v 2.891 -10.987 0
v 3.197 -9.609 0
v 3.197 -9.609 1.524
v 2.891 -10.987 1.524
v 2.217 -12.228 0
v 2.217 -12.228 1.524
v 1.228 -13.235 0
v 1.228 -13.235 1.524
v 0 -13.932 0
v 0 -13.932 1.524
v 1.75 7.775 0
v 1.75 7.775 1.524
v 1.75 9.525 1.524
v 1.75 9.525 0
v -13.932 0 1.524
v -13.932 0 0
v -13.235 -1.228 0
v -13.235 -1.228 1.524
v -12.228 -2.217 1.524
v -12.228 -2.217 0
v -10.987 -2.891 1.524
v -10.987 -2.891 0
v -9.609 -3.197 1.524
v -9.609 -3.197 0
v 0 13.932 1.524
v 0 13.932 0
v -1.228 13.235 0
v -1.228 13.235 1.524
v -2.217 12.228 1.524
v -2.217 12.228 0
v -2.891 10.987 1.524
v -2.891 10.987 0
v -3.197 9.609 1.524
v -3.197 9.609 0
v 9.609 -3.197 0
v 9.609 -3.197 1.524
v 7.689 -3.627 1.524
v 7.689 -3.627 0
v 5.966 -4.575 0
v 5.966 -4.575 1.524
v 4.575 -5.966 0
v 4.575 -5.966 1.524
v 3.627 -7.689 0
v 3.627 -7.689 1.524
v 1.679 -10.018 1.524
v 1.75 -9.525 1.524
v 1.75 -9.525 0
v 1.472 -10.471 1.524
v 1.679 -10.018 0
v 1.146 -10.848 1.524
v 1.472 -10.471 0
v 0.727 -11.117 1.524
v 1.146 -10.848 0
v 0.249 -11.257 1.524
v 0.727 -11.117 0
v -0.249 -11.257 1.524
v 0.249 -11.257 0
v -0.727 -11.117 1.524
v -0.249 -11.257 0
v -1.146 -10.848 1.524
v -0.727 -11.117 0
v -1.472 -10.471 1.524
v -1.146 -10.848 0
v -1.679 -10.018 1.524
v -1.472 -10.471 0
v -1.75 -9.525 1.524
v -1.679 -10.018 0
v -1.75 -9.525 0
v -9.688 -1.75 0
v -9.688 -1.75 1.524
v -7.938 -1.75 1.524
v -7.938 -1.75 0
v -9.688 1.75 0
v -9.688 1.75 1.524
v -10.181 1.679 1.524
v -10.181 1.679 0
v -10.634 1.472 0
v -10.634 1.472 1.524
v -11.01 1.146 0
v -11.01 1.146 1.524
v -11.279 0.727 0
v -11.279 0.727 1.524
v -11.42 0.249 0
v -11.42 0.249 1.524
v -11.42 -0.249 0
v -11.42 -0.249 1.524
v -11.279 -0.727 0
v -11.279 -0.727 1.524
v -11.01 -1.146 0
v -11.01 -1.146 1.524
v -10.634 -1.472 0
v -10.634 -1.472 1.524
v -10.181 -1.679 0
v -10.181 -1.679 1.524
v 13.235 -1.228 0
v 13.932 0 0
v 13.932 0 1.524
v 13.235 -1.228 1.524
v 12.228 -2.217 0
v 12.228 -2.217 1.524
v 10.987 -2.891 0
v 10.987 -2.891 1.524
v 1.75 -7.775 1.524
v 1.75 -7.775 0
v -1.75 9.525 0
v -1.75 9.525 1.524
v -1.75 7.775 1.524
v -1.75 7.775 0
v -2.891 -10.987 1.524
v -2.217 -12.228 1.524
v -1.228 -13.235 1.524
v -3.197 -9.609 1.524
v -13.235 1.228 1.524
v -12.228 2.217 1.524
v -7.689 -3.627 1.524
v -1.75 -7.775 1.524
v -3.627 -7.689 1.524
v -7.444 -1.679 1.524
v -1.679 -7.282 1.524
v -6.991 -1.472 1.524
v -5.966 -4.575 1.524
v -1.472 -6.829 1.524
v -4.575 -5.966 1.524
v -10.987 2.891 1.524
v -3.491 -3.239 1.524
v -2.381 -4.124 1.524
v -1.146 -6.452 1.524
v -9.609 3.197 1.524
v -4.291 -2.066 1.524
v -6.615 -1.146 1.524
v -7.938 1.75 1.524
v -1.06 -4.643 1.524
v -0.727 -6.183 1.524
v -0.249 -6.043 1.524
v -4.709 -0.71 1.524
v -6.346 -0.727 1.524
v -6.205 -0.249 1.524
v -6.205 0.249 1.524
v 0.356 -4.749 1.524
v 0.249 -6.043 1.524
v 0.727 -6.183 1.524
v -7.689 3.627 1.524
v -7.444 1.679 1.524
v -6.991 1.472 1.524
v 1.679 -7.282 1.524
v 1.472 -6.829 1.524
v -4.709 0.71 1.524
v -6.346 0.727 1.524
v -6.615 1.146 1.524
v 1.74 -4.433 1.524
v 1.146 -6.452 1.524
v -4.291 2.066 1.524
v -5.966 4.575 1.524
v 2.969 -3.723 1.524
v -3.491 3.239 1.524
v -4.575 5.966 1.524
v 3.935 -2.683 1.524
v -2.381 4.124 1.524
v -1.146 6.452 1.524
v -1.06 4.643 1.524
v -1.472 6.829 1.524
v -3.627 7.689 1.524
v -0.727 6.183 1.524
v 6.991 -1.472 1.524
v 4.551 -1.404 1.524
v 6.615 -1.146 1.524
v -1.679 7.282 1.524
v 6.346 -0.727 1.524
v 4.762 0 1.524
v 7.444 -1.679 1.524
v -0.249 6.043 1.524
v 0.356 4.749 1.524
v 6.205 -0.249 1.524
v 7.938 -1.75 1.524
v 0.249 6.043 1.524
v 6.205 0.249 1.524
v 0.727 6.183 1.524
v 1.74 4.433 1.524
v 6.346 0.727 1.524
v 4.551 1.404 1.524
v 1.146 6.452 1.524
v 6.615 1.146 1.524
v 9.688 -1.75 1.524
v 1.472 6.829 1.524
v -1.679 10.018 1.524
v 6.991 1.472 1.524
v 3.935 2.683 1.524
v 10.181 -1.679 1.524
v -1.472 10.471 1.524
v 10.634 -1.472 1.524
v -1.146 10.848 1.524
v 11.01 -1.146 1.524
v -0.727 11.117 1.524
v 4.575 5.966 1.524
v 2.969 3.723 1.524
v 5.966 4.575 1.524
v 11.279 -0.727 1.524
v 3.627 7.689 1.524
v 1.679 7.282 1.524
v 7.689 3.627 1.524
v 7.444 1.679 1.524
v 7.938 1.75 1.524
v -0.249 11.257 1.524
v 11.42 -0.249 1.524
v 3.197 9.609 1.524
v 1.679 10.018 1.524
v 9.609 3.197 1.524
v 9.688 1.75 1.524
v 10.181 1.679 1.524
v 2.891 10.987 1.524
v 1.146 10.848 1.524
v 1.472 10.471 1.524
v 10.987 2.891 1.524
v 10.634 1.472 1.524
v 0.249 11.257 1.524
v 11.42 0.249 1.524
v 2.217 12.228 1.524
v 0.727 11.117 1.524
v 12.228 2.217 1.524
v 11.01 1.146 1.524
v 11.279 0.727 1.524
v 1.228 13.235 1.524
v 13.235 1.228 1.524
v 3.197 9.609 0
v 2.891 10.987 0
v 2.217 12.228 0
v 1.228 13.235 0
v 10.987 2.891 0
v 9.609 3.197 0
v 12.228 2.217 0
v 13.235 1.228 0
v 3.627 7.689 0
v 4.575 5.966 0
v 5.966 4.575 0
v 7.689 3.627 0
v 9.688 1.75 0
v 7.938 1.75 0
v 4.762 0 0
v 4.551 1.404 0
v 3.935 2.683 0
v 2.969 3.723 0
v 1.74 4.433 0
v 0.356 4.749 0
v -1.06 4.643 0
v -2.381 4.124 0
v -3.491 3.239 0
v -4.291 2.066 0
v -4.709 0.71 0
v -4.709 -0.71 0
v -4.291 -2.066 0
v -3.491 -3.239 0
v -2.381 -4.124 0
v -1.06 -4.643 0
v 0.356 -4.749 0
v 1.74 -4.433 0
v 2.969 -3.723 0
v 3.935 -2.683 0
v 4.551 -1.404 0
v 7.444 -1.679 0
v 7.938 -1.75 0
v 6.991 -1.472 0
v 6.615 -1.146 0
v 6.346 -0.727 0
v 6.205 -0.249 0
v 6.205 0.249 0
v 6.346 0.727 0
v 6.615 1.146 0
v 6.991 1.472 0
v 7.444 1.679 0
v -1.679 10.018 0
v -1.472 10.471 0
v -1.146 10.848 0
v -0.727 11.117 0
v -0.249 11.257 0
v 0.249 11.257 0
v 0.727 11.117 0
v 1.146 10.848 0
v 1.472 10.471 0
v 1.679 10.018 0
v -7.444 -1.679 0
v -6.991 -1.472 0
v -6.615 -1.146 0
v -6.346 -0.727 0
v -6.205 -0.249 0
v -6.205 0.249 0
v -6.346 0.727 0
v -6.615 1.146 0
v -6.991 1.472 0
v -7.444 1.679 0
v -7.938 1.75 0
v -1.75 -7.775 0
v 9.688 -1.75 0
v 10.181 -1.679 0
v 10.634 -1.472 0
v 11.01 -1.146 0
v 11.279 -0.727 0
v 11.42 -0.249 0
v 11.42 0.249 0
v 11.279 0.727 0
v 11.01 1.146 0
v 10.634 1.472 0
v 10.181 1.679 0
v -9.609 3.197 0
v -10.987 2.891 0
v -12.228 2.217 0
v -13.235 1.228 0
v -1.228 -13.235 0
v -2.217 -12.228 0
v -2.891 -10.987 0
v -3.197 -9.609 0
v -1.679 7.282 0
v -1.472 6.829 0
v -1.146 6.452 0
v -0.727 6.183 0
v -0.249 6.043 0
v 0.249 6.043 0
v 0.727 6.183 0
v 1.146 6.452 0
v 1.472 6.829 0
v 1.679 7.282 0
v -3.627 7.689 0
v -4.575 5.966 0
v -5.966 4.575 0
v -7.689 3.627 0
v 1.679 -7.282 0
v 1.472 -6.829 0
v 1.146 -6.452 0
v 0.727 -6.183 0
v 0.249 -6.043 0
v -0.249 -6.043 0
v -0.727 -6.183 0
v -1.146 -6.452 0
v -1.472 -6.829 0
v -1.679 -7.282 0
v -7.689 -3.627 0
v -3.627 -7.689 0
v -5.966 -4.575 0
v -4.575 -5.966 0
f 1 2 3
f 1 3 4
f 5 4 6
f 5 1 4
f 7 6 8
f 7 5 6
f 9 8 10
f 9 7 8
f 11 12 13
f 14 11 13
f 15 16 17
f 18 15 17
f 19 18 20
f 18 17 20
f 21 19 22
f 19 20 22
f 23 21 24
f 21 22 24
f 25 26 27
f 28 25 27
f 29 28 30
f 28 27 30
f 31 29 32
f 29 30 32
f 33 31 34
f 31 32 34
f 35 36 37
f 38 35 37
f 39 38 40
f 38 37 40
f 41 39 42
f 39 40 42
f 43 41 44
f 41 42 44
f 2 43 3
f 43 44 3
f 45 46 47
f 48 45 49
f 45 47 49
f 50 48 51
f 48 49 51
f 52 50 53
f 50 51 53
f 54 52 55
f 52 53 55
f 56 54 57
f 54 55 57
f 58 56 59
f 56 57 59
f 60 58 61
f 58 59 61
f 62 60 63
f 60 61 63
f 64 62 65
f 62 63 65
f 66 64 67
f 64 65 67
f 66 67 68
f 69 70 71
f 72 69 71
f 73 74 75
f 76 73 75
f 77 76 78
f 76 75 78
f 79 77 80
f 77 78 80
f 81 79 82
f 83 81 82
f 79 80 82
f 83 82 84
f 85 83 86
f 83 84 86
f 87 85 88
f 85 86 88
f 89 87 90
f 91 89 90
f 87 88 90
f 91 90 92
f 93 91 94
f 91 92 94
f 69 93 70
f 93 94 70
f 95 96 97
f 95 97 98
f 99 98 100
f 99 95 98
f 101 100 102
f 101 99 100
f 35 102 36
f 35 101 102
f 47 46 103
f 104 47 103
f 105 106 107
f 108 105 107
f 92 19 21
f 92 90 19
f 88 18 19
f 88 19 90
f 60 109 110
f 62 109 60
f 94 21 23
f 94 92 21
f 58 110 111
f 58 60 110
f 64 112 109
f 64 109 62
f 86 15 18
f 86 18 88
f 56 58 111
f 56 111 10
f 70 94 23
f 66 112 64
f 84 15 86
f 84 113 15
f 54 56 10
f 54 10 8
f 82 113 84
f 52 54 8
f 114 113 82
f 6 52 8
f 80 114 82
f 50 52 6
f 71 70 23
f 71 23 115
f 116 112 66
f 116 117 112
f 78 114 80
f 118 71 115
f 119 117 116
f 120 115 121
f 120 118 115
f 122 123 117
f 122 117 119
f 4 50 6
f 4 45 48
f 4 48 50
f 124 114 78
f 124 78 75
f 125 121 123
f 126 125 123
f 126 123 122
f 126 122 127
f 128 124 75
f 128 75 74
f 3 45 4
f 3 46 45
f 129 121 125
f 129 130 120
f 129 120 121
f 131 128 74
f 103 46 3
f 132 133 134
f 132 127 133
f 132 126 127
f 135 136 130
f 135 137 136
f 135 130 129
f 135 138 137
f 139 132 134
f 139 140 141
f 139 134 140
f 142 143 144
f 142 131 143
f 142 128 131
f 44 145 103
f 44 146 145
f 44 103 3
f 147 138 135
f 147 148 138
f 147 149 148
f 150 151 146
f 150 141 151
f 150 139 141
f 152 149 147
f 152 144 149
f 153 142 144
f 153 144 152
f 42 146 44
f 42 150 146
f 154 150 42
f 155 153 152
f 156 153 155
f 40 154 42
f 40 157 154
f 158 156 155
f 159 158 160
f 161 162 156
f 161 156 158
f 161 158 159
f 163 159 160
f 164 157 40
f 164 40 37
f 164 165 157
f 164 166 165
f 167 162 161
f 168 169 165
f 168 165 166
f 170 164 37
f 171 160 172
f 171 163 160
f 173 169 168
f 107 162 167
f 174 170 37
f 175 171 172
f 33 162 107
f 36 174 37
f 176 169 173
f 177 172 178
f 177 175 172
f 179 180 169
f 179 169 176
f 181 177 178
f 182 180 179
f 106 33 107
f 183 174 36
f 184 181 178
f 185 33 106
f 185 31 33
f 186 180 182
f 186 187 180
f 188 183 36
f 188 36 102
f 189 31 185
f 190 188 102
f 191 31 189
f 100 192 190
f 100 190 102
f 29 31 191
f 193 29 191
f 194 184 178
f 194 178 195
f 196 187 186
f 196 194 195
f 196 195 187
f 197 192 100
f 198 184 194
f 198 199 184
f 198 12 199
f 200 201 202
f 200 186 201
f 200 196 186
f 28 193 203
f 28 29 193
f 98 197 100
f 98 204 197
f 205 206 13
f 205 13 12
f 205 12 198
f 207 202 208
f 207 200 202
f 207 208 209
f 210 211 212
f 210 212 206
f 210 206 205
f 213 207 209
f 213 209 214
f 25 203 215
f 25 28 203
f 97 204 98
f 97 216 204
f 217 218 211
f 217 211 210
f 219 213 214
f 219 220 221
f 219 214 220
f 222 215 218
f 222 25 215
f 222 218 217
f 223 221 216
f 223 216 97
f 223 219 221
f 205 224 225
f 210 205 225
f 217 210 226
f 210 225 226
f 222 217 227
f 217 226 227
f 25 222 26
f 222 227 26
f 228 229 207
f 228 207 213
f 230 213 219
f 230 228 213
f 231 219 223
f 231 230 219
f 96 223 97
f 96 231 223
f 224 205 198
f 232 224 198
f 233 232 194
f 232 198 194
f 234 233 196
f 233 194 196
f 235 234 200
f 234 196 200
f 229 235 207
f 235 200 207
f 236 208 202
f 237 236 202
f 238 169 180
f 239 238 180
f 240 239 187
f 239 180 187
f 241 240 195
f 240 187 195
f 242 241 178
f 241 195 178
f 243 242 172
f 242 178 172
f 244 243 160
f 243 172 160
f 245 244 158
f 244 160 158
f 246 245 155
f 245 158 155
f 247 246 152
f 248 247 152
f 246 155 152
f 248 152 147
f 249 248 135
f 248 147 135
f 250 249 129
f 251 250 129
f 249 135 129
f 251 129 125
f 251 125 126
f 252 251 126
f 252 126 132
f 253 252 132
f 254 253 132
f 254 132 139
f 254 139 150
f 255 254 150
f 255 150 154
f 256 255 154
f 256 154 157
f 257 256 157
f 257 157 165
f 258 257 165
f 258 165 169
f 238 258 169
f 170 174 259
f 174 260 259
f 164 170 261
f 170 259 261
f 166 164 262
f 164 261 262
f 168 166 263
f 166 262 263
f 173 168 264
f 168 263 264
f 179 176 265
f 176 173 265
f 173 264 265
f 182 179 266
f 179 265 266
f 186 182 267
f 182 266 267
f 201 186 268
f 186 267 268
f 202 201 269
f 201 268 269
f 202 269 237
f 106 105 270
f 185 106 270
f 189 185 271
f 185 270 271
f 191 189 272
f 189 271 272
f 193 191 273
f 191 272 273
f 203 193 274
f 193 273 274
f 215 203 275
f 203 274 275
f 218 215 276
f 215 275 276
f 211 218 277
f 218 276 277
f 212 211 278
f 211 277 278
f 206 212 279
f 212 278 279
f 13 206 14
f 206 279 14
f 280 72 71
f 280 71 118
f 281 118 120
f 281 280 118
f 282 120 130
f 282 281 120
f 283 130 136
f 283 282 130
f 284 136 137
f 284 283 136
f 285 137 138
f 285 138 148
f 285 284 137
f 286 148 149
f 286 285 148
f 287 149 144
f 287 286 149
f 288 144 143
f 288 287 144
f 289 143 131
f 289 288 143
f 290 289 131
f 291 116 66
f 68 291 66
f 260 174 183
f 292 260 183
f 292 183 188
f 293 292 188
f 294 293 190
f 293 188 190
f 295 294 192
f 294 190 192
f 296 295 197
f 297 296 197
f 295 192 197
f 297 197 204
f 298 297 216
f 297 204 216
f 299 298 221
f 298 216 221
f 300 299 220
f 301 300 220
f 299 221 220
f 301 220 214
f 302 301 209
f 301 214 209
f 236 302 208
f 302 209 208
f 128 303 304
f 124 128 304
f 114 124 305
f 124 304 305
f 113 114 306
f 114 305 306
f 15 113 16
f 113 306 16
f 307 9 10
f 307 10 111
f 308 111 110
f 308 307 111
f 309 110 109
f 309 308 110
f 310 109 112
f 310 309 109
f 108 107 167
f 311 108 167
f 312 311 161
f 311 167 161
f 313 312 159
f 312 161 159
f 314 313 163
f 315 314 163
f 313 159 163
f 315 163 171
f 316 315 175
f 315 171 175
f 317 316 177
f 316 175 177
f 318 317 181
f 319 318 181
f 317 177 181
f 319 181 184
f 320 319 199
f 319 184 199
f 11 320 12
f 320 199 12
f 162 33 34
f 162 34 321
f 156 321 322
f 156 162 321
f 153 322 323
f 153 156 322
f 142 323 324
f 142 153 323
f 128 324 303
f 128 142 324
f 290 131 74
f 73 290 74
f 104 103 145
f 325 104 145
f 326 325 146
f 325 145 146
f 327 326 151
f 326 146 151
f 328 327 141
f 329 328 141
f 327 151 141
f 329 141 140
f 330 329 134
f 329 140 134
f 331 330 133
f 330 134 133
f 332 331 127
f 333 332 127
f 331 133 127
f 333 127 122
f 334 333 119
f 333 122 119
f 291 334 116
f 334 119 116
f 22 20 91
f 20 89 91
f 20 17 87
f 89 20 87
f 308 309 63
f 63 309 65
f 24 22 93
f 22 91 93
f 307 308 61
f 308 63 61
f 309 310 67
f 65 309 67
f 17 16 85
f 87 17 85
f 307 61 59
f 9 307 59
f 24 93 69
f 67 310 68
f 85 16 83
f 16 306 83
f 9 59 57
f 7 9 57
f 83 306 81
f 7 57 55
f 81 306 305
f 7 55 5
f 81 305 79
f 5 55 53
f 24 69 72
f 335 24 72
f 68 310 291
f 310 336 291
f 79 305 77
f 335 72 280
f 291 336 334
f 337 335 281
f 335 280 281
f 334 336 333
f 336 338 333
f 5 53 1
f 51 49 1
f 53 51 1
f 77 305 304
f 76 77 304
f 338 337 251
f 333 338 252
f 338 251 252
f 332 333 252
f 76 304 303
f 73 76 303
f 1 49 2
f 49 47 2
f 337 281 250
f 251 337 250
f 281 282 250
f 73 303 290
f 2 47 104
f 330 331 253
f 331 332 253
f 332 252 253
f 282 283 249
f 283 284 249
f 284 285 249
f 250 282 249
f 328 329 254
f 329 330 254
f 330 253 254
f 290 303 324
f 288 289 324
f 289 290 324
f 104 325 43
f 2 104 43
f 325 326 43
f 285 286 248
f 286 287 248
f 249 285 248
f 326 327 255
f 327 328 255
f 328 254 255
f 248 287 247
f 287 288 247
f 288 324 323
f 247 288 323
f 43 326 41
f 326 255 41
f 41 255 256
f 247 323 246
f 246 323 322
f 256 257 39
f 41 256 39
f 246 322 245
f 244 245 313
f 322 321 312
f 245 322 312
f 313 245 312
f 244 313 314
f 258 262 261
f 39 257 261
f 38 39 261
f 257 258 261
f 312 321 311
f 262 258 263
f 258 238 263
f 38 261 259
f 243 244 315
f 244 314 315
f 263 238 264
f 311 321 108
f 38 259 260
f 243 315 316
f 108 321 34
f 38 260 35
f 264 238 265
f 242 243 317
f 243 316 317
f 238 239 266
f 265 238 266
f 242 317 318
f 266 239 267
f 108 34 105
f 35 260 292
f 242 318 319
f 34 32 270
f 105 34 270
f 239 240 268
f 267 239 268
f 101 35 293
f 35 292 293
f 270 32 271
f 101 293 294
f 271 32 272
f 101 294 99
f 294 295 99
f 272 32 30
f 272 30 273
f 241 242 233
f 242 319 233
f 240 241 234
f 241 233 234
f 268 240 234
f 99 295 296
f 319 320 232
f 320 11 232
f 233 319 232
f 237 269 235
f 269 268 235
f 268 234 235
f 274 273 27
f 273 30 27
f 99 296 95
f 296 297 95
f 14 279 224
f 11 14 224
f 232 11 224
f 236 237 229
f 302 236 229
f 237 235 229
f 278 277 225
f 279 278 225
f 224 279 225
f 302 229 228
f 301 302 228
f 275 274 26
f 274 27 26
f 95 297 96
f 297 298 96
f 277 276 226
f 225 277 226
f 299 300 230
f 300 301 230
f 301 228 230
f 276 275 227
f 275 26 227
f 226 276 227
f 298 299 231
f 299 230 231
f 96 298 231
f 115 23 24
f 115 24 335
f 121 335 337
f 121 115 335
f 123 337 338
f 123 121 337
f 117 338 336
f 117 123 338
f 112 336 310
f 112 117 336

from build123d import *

# Parameters (mm, degrees)
F0_R        = 1.75
F1_DEPTH    = 1.524
F2_R        = 6.985
F3_T1_DEPTH = 26.7357127365
F4_R        = 4.7625
F5_DEPTH    = 25.4


# Not quite as in the source:
# - a fillet or chamfer that OpenCascade refuses, or shapes differently, is made with other operations: its cross-section is extruded or revolved along the edge and cut away or added


with BuildPart() as f1:
    # F0 (on Top) → F1 (new body)
    with BuildSketch(Plane.XY):
        Polygon((3.175, 3.175), (3.175, 14.2875), (-3.175, 14.2875), (-3.175, 3.175), (-14.2875, 3.175), (-14.2875, -3.175), (-3.175, -3.175), (-3.175, -14.2875), (3.175, -14.2875), (3.175, -3.175), (14.2875, -3.175), (14.2875, 3.175), align=None)
        with BuildLine():
            ThreePointArc((1.75, -9.525), (-1.2374368671, -10.7624368671), (0, -7.775))
            ThreePointArc((0, -7.775), (1.2374368671, -8.2875631329), (1.75, -9.525))
        make_face(mode=Mode.SUBTRACT)
        with Locations((-7.9375, 0)):
            Circle(F0_R, mode=Mode.SUBTRACT)
        with BuildLine():
            ThreePointArc((9.6875, 0), (7.9375, -1.75), (6.1875, 0))
            ThreePointArc((6.1875, 0), (7.9375, 1.75), (9.6875, 0))
        make_face(mode=Mode.SUBTRACT)
        with BuildLine():
            ThreePointArc((0, 7.775), (-1.2374368671, 10.7624368671), (1.75, 9.525))
            ThreePointArc((1.75, 9.525), (1.2374368671, 8.2875631329), (0, 7.775))
        make_face(mode=Mode.SUBTRACT)
    extrude(amount=F1_DEPTH)

    # F2
    f2_edges = [f1.edges().sort_by_distance(p)[0] for p in [
        (3.175, -3.175, 0.762),
        (-3.175, 3.175, 0.762),
        (3.175, 3.175, 0.762),
        (-3.175, -3.175, 0.762),
    ]]
    fillet(f2_edges, radius=F2_R)

    # F3: fillet of radius 5.08 on 8 edges, made by hand

    # F3_s2 → F3_t1 (cut)
    with BuildSketch(Plane.XY.offset(-12.6058563682)):
        with BuildLine():
            ThreePointArc((3.1968016831, 9.6085526316), (1.5800515868, 12.9387027128), (-1.8673425473, 14.2875))
            Line((-1.8673425473, 14.2875), (-1.8673425473, 14.7955))
            Line((-1.8673425473, 14.7955), (3.175, 14.7955))
            Line((3.175, 14.7955), (3.683, 14.2875))
            ThreePointArc((3.683, 14.2875), (3.683, 10.16), (3.7032161062, 9.6486578947))
            Line((3.7032161062, 9.6486578947), (3.1968016831, 9.6085526316))
        make_face()
        with BuildLine():
            ThreePointArc((1.8673425473, 14.2875), (-1.5800515868, 12.9387027128), (-3.1968016831, 9.6085526316))
            Line((-3.1968016831, 9.6085526316), (-3.7032161062, 9.6486578947))
            ThreePointArc((-3.7032161062, 9.6486578947), (-3.683, 10.16), (-3.683, 14.2875))
            Line((-3.683, 14.2875), (-3.175, 14.7955))
            Line((-3.175, 14.7955), (1.8673425473, 14.7955))
            Line((1.8673425473, 14.7955), (1.8673425473, 14.2875))
        make_face()
        with BuildLine():
            ThreePointArc((-14.2875, 1.8673425473), (-12.9387027128, -1.5800515868), (-9.6085526316, -3.1968016831))
            Line((-9.6085526316, -3.1968016831), (-9.6486578947, -3.7032161062))
            ThreePointArc((-9.6486578947, -3.7032161062), (-10.16, -3.683), (-14.2875, -3.683))
            Line((-14.2875, -3.683), (-14.7955, -3.175))
            Line((-14.7955, -3.175), (-14.7955, 1.8673425473))
            Line((-14.7955, 1.8673425473), (-14.2875, 1.8673425473))
        make_face()
        with BuildLine():
            ThreePointArc((-9.6085526316, 3.1968016831), (-12.9387027128, 1.5800515868), (-14.2875, -1.8673425473))
            Line((-14.2875, -1.8673425473), (-14.7955, -1.8673425473))
            Line((-14.7955, -1.8673425473), (-14.7955, 3.175))
            Line((-14.7955, 3.175), (-14.2875, 3.683))
            ThreePointArc((-14.2875, 3.683), (-10.16, 3.683), (-9.6486578947, 3.7032161062))
            Line((-9.6486578947, 3.7032161062), (-9.6085526316, 3.1968016831))
        make_face()
        with BuildLine():
            ThreePointArc((1.8673425473, -14.2875), (-1.5800515868, -12.9387027128), (-3.1968016831, -9.6085526316))
            Line((-3.1968016831, -9.6085526316), (-3.7032161062, -9.6486578947))
            ThreePointArc((-3.7032161062, -9.6486578947), (-3.683, -10.16), (-3.683, -14.2875))
            Line((-3.683, -14.2875), (-3.175, -14.7955))
            Line((-3.175, -14.7955), (1.8673425473, -14.7955))
            Line((1.8673425473, -14.7955), (1.8673425473, -14.2875))
        make_face()
        with BuildLine():
            ThreePointArc((3.1968016831, -9.6085526316), (1.5800515868, -12.9387027128), (-1.8673425473, -14.2875))
            Line((-1.8673425473, -14.2875), (-1.8673425473, -14.7955))
            Line((-1.8673425473, -14.7955), (3.175, -14.7955))
            Line((3.175, -14.7955), (3.683, -14.2875))
            ThreePointArc((3.683, -14.2875), (3.683, -10.16), (3.7032161062, -9.6486578947))
            Line((3.7032161062, -9.6486578947), (3.1968016831, -9.6085526316))
        make_face()
        with BuildLine():
            ThreePointArc((14.2875, 1.8673425473), (12.9387027128, -1.5800515868), (9.6085526316, -3.1968016831))
            Line((9.6085526316, -3.1968016831), (9.6486578947, -3.7032161062))
            ThreePointArc((9.6486578947, -3.7032161062), (10.16, -3.683), (14.2875, -3.683))
            Line((14.2875, -3.683), (14.7955, -3.175))
            Line((14.7955, -3.175), (14.7955, 1.8673425473))
            Line((14.7955, 1.8673425473), (14.2875, 1.8673425473))
        make_face()
        with BuildLine():
            ThreePointArc((9.6085526316, 3.1968016831), (12.9387027128, 1.5800515868), (14.2875, -1.8673425473))
            Line((14.2875, -1.8673425473), (14.7955, -1.8673425473))
            Line((14.7955, -1.8673425473), (14.7955, 3.175))
            Line((14.7955, 3.175), (14.2875, 3.683))
            ThreePointArc((14.2875, 3.683), (10.16, 3.683), (9.6486578947, 3.7032161062))
            Line((9.6486578947, 3.7032161062), (9.6085526316, 3.1968016831))
        make_face()
    extrude(amount=F3_T1_DEPTH, mode=Mode.SUBTRACT)

    # F4 (on face) → F5 (cut)
    with BuildSketch(Plane.XY.offset(1.524)):
        Circle(F4_R)
        with BuildLine():
            ThreePointArc((1.75, 9.525), (0, 11.275), (-1.75, 9.525))
            Line((-1.75, 9.525), (-1.75, 7.775))
            ThreePointArc((-1.75, 7.775), (0, 6.025), (1.75, 7.775))
            Line((1.75, 7.775), (1.75, 9.525))
        make_face()
        with BuildLine():
            ThreePointArc((-1.75, -9.525), (0, -11.275), (1.75, -9.525))
            Line((1.75, -9.525), (1.75, -7.775))
            ThreePointArc((1.75, -7.775), (0, -6.025), (-1.75, -7.775))
            Line((-1.75, -7.775), (-1.75, -9.525))
        make_face()
        with BuildLine():
            ThreePointArc((7.9375, 1.75), (6.1875, 0), (7.9375, -1.75))
            Line((7.9375, -1.75), (9.6875, -1.75))
            ThreePointArc((9.6875, -1.75), (11.4375, 0), (9.6875, 1.75))
            Line((9.6875, 1.75), (7.9375, 1.75))
        make_face()
        with BuildLine():
            ThreePointArc((-7.9375, -1.75), (-6.1875, 0), (-7.9375, 1.75))
            Line((-7.9375, 1.75), (-9.6875, 1.75))
            ThreePointArc((-9.6875, 1.75), (-11.4375, 0), (-9.6875, -1.75))
            Line((-9.6875, -1.75), (-7.9375, -1.75))
        make_face()
    extrude(amount=-F5_DEPTH, mode=Mode.SUBTRACT)


solid = f1.part
